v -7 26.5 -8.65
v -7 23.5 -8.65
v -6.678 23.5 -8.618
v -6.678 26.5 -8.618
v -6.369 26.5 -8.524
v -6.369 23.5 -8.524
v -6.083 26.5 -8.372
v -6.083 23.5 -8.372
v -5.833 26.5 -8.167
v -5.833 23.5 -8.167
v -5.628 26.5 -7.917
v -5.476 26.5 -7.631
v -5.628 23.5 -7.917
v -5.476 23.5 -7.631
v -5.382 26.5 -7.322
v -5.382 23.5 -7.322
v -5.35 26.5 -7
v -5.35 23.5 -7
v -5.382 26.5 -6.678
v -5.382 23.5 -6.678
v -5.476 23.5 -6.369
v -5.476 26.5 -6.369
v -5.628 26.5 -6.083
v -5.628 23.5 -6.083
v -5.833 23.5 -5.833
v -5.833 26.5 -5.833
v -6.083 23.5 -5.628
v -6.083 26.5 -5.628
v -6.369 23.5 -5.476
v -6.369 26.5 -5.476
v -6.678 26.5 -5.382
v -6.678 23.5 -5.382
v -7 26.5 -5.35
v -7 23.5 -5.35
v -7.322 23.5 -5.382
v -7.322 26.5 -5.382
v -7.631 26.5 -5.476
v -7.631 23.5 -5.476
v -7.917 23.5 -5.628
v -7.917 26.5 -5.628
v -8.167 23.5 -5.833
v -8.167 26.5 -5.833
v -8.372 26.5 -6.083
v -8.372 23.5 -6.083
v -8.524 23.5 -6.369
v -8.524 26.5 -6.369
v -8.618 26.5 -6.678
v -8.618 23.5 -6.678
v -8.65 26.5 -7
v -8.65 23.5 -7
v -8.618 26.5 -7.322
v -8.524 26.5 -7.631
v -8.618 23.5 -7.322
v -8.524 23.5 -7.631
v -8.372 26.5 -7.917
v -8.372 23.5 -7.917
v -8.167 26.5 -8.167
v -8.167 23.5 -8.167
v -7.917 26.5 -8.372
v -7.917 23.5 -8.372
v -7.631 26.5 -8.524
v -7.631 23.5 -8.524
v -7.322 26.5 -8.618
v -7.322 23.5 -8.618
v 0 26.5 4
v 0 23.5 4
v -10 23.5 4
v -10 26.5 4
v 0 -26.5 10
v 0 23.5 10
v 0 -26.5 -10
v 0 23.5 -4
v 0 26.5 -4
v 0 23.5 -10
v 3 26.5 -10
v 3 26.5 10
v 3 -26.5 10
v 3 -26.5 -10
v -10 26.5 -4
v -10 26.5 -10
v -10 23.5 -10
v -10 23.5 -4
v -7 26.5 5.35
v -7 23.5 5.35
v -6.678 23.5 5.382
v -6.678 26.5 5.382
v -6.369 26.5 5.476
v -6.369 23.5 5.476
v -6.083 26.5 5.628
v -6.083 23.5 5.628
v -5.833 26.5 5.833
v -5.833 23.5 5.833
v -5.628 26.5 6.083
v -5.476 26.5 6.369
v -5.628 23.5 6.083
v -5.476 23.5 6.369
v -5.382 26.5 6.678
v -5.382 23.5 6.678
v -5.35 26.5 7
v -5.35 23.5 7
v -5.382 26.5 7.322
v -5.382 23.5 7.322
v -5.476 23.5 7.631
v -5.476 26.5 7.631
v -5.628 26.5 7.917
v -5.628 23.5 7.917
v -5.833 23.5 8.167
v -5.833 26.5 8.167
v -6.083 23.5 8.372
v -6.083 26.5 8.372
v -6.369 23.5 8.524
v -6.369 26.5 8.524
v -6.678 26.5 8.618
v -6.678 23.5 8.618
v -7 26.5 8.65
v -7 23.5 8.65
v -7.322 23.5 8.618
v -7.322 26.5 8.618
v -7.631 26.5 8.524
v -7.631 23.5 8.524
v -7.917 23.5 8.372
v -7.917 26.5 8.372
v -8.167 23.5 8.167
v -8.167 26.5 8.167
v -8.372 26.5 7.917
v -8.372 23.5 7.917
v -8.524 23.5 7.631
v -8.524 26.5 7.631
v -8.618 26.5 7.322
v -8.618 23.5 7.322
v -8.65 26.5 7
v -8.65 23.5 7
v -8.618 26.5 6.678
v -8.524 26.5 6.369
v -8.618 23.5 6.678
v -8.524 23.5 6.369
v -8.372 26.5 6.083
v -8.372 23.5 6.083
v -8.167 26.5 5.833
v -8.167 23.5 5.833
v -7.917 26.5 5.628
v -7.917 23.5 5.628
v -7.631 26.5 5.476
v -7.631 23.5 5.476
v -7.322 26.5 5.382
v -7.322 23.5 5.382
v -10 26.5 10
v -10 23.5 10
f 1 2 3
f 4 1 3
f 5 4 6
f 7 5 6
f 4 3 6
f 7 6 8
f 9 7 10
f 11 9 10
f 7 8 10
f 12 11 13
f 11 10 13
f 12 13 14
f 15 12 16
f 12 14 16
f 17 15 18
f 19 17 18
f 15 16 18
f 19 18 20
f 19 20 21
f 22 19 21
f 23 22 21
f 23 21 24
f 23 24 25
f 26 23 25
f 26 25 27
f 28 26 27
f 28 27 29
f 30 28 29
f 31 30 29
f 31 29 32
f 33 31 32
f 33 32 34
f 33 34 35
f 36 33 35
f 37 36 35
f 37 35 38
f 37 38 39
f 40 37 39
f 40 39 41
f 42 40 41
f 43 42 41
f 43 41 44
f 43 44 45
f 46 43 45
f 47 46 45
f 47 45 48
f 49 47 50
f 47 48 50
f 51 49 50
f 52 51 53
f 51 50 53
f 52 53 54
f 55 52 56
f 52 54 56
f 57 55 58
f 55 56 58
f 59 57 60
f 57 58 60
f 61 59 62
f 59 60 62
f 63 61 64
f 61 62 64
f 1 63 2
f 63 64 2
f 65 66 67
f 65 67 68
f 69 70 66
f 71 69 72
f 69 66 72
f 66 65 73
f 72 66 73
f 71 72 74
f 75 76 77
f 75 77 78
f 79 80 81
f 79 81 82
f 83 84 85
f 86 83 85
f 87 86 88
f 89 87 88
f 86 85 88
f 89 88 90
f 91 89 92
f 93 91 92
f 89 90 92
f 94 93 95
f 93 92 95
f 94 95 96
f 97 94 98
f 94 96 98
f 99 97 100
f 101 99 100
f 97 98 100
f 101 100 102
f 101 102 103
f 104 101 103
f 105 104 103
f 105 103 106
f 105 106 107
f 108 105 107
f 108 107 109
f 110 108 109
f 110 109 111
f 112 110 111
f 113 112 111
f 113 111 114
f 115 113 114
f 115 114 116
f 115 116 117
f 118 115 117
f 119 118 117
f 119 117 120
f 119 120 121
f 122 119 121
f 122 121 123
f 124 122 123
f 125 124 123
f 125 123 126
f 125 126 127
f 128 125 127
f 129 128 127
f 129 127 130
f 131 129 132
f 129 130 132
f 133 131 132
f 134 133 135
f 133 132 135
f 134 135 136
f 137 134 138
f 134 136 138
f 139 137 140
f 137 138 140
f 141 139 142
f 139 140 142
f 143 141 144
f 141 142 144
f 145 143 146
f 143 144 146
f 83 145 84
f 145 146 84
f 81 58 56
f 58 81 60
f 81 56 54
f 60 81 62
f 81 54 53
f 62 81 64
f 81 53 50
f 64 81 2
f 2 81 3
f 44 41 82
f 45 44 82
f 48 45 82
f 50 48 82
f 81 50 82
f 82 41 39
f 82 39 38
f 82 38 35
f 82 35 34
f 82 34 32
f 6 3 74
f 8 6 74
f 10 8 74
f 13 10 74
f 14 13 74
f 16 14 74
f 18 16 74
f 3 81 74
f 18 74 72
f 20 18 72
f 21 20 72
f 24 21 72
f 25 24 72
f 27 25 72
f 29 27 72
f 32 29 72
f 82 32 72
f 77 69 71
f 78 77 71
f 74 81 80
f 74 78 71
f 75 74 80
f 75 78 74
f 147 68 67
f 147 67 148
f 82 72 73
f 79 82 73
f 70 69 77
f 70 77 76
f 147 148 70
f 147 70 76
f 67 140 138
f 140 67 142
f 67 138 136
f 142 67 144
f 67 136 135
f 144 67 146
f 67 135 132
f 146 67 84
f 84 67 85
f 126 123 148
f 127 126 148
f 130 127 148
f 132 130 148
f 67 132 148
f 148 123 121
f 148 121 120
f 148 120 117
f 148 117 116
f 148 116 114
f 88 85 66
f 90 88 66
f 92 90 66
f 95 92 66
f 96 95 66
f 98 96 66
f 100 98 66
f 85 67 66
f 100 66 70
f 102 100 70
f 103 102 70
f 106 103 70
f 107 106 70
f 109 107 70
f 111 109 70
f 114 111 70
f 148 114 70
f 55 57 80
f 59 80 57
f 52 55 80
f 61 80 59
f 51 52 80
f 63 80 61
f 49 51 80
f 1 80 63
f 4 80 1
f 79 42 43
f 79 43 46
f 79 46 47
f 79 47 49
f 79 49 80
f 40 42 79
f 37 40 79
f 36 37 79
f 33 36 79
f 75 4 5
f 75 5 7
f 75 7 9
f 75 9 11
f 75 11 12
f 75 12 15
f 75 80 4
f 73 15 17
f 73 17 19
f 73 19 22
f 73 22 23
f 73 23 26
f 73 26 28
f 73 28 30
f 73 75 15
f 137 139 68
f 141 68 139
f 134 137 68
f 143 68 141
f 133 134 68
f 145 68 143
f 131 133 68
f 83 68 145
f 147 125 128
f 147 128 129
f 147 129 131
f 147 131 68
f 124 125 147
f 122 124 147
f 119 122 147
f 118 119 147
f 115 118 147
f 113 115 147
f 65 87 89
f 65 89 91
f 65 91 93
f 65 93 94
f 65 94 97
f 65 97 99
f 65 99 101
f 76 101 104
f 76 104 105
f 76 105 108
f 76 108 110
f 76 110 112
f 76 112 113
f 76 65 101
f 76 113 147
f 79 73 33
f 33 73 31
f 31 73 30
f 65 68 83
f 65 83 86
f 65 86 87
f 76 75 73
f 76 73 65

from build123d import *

# Parameters (mm, degrees)
SKETCH1_W           = 20
SKETCH1_H           = 53
BOSS_EXTRUDE1_DEPTH = 3
SKETCH2_W           = 6
SKETCH2_H           = 3
BOSS_EXTRUDE2_DEPTH = 10
CUT_EXTRUDE1_REACH  = 53.962
SKETCH4_R           = 1.65


with BuildPart() as part:
    # Sketch1 → Boss-Extrude1 (new body)
    with BuildSketch(Plane(origin=(0, 0, 0), x_dir=(0, 0, -1), z_dir=(1, 0, 0))):
        Rectangle(SKETCH1_W, SKETCH1_H)
    extrude(amount=BOSS_EXTRUDE1_DEPTH)

    # Sketch2 → Boss-Extrude2 (add)
    with BuildSketch(Plane.ZY):
        with Locations((-7, 25)):
            Rectangle(SKETCH2_W, SKETCH2_H)
        with Locations((7, 25)):
            Rectangle(SKETCH2_W, SKETCH2_H)
    extrude(amount=BOSS_EXTRUDE2_DEPTH)

    # Sketch4 → Cut-Extrude1 (cut, up to next)
    with BuildSketch(Plane.XZ.offset(-23.5), mode=Mode.PRIVATE) as cut_extrude1_sk1:
        with Locations(Location((-7, 7, 0), (0, 0, 270))):
            Circle(SKETCH4_R)
    cut_extrude1_tool1 = extrude(cut_extrude1_sk1.sketch, amount=-CUT_EXTRUDE1_REACH, mode=Mode.PRIVATE) & part.part
    # Sketch4 → Cut-Extrude1 (cut, up to next)
    with BuildSketch(Plane.XZ.offset(-23.5), mode=Mode.PRIVATE) as cut_extrude1_sk2:
        with Locations(Location((-7, -7, 0), (0, 0, 270))):
            Circle(SKETCH4_R)
    cut_extrude1_tool2 = extrude(cut_extrude1_sk2.sketch, amount=-CUT_EXTRUDE1_REACH, mode=Mode.PRIVATE) & part.part
    add(cut_extrude1_tool1.solids().sort_by_distance((-7, 23.5, 7))[0], mode=Mode.SUBTRACT)
    add(cut_extrude1_tool2.solids().sort_by_distance((-7, 23.5, -7))[0], mode=Mode.SUBTRACT)


solid = part.part
